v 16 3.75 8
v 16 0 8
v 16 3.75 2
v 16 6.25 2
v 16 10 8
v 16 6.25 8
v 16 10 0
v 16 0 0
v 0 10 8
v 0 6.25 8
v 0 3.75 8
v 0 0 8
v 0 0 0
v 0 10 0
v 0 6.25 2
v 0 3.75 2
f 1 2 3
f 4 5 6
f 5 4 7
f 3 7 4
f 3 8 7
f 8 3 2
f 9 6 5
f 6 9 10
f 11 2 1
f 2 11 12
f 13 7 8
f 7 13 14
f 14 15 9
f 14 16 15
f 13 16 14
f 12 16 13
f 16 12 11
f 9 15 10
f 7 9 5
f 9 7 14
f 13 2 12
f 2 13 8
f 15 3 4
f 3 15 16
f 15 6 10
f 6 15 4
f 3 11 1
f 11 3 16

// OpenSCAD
$fn = 32;

// ----------------------------------------------------------------------
// Micro clip: slotted block, 5-20 mm class
// ----------------------------------------------------------------------

// --- parameters (mm) ---
block_l = 16;             // block length, X
block_w = 10;             // block width, Y
block_h = 8;              // block height, Z
slot_w = 2.5;             // slot width
slot_d = 6;               // slot depth from the top

difference() {
  cube([block_l, block_w, block_h]);
  translate([-1, block_w / 2 - slot_w / 2, block_h - slot_d])
    cube([block_l + 2, slot_w, slot_d + 1]);
}
